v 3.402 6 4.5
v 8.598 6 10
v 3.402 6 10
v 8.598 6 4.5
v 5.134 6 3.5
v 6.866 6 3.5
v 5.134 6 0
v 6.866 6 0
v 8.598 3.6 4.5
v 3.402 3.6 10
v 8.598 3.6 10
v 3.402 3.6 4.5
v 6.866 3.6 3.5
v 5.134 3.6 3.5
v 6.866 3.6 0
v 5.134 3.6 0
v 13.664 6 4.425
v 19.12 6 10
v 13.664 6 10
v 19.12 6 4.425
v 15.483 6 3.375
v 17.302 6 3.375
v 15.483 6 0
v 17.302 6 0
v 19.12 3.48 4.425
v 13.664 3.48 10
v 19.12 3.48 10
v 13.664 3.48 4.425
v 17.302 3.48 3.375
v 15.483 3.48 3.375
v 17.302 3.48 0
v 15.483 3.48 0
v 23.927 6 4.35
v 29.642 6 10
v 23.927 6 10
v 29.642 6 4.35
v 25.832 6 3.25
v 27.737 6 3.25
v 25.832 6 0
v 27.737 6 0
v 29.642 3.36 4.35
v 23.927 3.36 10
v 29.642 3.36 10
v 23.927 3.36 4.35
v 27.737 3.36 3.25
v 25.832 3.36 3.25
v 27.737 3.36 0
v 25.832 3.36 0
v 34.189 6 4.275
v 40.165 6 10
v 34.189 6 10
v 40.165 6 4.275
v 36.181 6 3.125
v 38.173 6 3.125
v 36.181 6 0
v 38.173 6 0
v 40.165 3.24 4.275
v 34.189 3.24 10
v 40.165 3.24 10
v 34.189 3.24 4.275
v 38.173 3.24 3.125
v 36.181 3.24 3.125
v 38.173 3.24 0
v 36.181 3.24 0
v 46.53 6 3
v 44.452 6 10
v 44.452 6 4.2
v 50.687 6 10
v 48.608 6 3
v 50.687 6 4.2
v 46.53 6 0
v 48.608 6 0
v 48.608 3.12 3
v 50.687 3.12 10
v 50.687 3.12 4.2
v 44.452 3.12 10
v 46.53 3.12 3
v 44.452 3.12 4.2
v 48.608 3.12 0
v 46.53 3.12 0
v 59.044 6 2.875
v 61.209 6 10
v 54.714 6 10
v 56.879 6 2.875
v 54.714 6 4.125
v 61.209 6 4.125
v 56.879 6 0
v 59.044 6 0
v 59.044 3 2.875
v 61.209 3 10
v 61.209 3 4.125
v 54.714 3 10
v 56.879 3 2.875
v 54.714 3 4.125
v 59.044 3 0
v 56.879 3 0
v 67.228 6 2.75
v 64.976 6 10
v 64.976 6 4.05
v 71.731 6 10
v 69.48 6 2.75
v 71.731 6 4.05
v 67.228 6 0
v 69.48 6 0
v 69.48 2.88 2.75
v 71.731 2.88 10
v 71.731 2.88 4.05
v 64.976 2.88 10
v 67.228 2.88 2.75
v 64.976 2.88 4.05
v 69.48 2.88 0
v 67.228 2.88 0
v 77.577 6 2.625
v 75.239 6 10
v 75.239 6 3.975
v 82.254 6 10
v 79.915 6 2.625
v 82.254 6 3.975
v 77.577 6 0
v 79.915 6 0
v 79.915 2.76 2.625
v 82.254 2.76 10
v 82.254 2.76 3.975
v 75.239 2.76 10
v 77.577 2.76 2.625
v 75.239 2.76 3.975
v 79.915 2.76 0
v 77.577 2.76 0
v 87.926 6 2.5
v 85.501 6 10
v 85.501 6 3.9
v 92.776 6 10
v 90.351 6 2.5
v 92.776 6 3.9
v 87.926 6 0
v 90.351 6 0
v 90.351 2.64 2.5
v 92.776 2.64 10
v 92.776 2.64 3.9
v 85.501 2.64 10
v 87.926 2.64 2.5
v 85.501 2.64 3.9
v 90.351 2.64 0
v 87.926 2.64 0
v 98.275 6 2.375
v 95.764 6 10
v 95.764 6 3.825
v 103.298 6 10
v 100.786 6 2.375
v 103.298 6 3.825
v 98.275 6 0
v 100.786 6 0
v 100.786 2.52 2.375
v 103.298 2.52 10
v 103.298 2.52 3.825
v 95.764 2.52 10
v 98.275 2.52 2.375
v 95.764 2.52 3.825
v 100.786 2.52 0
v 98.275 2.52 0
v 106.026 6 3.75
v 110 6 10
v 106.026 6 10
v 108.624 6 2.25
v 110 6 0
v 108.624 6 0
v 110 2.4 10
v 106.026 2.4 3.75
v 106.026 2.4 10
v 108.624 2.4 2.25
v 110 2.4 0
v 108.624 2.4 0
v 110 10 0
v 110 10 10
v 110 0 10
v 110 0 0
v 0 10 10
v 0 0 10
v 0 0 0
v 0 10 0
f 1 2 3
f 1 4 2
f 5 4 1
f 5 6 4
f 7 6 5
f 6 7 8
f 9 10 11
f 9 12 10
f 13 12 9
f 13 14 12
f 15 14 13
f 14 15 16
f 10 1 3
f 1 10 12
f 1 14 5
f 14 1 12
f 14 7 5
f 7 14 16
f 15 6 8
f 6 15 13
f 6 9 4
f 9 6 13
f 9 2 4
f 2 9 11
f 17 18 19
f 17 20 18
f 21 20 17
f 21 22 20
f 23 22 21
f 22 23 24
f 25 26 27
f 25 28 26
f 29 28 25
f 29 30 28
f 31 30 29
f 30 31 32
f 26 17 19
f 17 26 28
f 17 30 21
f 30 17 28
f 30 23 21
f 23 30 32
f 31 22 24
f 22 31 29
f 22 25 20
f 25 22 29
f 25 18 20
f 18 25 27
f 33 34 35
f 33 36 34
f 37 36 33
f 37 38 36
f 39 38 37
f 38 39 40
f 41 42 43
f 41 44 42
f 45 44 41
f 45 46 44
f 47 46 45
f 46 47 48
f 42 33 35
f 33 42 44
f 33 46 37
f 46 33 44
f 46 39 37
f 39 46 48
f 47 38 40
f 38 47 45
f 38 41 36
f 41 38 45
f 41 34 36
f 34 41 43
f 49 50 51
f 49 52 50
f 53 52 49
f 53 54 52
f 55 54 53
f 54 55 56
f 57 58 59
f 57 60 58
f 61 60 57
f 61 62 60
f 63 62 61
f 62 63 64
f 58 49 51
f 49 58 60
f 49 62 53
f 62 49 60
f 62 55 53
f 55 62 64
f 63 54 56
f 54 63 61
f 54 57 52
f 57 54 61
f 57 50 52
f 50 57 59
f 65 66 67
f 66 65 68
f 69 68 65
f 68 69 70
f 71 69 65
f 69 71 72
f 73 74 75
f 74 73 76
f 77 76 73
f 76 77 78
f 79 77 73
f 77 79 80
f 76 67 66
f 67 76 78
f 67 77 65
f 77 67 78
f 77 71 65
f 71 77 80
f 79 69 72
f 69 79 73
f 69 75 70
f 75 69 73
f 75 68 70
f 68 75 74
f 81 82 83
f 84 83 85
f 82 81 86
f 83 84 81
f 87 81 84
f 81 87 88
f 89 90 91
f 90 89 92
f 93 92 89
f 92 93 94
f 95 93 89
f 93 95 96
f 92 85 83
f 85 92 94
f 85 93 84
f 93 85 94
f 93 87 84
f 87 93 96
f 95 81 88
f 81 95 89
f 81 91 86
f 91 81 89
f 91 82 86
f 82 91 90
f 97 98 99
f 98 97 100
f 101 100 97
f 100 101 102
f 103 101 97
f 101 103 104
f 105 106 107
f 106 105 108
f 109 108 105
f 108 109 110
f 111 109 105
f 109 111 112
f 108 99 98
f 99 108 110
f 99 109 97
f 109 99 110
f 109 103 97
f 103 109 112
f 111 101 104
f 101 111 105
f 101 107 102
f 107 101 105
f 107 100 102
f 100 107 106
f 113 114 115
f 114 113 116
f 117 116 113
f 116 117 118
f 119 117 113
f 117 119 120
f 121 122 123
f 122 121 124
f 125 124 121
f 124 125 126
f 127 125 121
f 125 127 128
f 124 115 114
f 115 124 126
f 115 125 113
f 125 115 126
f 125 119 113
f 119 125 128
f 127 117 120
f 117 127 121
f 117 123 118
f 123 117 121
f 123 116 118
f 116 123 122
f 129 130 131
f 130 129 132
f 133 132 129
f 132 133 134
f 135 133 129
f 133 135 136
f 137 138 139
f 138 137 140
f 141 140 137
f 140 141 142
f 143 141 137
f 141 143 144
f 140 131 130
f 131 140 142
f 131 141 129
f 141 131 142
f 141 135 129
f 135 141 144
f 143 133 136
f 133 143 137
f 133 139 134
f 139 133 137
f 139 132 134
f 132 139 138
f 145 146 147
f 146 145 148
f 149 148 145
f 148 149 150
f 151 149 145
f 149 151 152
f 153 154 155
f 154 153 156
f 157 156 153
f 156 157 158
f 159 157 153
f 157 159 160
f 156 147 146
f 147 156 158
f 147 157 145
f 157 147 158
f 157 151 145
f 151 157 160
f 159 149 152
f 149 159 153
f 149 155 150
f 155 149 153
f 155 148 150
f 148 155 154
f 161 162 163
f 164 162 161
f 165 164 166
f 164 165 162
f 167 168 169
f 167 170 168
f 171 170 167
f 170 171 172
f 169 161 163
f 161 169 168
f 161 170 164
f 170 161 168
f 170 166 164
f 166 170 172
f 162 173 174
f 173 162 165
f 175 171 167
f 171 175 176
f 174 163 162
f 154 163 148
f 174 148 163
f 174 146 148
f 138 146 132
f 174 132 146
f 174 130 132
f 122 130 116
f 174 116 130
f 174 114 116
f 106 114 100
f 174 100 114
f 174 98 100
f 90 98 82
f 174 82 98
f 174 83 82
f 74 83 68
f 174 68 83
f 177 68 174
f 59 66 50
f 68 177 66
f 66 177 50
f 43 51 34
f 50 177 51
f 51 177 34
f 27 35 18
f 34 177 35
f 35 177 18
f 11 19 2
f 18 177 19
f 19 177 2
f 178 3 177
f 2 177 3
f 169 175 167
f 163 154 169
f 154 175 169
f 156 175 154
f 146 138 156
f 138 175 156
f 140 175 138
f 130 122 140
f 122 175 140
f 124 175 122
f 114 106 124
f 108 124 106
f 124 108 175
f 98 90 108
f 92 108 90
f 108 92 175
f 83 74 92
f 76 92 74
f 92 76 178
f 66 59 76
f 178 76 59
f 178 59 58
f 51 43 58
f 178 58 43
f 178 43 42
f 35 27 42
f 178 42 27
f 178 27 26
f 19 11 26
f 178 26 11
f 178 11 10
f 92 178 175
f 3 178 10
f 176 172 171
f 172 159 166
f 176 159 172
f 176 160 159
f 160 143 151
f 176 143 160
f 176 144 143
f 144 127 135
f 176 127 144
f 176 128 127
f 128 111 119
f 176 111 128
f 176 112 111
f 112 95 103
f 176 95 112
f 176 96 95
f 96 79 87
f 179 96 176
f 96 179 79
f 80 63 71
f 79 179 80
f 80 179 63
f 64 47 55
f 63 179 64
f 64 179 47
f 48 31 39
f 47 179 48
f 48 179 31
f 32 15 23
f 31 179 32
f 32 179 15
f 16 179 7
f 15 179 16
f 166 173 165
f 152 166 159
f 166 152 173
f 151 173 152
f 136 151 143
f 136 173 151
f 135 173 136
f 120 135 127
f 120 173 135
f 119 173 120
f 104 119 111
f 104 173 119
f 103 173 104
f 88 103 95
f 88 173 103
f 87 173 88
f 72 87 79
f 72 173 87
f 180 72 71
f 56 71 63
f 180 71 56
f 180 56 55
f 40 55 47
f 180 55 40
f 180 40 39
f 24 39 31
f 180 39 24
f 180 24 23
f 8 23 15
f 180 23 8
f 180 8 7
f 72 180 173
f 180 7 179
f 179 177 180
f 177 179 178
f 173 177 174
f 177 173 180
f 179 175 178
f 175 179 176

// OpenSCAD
widthAcrossCorners=6; //in mm for an M3 nut
widthAcrossFlats=2*sin(60)*widthAcrossCorners/2; //in mm for an M3 nut.
thickness=2.4; //in mm for an M3 nut

//cube([5,20,10]); //Solid block for holes

module scaledNutSlot(scaleFactor) {
linear_extrude(height=scaleFactor*thickness) 
union() {
    rotate([0,0,360/12]) circle(r=scaleFactor*widthAcrossCorners/2,$fn=6);
    translate([-scaleFactor*widthAcrossFlats/2,0,0]) square(size=[scaleFactor*widthAcrossFlats,20],center=false);
    translate([-scaleFactor*widthAcrossFlats/6,-20,0]) square(size=[scaleFactor*widthAcrossFlats/3,20],center=false);
}
}

difference() {
cube(size=[110,10,10]);
translate([6,6,6])
rotate([90,0,0])
for(scaleFactor = [1.00:0.05:1.5]) {
    translate([(scaleFactor-1)*20*widthAcrossFlats*2,0,0]) scaledNutSlot(scaleFactor);
}
}
